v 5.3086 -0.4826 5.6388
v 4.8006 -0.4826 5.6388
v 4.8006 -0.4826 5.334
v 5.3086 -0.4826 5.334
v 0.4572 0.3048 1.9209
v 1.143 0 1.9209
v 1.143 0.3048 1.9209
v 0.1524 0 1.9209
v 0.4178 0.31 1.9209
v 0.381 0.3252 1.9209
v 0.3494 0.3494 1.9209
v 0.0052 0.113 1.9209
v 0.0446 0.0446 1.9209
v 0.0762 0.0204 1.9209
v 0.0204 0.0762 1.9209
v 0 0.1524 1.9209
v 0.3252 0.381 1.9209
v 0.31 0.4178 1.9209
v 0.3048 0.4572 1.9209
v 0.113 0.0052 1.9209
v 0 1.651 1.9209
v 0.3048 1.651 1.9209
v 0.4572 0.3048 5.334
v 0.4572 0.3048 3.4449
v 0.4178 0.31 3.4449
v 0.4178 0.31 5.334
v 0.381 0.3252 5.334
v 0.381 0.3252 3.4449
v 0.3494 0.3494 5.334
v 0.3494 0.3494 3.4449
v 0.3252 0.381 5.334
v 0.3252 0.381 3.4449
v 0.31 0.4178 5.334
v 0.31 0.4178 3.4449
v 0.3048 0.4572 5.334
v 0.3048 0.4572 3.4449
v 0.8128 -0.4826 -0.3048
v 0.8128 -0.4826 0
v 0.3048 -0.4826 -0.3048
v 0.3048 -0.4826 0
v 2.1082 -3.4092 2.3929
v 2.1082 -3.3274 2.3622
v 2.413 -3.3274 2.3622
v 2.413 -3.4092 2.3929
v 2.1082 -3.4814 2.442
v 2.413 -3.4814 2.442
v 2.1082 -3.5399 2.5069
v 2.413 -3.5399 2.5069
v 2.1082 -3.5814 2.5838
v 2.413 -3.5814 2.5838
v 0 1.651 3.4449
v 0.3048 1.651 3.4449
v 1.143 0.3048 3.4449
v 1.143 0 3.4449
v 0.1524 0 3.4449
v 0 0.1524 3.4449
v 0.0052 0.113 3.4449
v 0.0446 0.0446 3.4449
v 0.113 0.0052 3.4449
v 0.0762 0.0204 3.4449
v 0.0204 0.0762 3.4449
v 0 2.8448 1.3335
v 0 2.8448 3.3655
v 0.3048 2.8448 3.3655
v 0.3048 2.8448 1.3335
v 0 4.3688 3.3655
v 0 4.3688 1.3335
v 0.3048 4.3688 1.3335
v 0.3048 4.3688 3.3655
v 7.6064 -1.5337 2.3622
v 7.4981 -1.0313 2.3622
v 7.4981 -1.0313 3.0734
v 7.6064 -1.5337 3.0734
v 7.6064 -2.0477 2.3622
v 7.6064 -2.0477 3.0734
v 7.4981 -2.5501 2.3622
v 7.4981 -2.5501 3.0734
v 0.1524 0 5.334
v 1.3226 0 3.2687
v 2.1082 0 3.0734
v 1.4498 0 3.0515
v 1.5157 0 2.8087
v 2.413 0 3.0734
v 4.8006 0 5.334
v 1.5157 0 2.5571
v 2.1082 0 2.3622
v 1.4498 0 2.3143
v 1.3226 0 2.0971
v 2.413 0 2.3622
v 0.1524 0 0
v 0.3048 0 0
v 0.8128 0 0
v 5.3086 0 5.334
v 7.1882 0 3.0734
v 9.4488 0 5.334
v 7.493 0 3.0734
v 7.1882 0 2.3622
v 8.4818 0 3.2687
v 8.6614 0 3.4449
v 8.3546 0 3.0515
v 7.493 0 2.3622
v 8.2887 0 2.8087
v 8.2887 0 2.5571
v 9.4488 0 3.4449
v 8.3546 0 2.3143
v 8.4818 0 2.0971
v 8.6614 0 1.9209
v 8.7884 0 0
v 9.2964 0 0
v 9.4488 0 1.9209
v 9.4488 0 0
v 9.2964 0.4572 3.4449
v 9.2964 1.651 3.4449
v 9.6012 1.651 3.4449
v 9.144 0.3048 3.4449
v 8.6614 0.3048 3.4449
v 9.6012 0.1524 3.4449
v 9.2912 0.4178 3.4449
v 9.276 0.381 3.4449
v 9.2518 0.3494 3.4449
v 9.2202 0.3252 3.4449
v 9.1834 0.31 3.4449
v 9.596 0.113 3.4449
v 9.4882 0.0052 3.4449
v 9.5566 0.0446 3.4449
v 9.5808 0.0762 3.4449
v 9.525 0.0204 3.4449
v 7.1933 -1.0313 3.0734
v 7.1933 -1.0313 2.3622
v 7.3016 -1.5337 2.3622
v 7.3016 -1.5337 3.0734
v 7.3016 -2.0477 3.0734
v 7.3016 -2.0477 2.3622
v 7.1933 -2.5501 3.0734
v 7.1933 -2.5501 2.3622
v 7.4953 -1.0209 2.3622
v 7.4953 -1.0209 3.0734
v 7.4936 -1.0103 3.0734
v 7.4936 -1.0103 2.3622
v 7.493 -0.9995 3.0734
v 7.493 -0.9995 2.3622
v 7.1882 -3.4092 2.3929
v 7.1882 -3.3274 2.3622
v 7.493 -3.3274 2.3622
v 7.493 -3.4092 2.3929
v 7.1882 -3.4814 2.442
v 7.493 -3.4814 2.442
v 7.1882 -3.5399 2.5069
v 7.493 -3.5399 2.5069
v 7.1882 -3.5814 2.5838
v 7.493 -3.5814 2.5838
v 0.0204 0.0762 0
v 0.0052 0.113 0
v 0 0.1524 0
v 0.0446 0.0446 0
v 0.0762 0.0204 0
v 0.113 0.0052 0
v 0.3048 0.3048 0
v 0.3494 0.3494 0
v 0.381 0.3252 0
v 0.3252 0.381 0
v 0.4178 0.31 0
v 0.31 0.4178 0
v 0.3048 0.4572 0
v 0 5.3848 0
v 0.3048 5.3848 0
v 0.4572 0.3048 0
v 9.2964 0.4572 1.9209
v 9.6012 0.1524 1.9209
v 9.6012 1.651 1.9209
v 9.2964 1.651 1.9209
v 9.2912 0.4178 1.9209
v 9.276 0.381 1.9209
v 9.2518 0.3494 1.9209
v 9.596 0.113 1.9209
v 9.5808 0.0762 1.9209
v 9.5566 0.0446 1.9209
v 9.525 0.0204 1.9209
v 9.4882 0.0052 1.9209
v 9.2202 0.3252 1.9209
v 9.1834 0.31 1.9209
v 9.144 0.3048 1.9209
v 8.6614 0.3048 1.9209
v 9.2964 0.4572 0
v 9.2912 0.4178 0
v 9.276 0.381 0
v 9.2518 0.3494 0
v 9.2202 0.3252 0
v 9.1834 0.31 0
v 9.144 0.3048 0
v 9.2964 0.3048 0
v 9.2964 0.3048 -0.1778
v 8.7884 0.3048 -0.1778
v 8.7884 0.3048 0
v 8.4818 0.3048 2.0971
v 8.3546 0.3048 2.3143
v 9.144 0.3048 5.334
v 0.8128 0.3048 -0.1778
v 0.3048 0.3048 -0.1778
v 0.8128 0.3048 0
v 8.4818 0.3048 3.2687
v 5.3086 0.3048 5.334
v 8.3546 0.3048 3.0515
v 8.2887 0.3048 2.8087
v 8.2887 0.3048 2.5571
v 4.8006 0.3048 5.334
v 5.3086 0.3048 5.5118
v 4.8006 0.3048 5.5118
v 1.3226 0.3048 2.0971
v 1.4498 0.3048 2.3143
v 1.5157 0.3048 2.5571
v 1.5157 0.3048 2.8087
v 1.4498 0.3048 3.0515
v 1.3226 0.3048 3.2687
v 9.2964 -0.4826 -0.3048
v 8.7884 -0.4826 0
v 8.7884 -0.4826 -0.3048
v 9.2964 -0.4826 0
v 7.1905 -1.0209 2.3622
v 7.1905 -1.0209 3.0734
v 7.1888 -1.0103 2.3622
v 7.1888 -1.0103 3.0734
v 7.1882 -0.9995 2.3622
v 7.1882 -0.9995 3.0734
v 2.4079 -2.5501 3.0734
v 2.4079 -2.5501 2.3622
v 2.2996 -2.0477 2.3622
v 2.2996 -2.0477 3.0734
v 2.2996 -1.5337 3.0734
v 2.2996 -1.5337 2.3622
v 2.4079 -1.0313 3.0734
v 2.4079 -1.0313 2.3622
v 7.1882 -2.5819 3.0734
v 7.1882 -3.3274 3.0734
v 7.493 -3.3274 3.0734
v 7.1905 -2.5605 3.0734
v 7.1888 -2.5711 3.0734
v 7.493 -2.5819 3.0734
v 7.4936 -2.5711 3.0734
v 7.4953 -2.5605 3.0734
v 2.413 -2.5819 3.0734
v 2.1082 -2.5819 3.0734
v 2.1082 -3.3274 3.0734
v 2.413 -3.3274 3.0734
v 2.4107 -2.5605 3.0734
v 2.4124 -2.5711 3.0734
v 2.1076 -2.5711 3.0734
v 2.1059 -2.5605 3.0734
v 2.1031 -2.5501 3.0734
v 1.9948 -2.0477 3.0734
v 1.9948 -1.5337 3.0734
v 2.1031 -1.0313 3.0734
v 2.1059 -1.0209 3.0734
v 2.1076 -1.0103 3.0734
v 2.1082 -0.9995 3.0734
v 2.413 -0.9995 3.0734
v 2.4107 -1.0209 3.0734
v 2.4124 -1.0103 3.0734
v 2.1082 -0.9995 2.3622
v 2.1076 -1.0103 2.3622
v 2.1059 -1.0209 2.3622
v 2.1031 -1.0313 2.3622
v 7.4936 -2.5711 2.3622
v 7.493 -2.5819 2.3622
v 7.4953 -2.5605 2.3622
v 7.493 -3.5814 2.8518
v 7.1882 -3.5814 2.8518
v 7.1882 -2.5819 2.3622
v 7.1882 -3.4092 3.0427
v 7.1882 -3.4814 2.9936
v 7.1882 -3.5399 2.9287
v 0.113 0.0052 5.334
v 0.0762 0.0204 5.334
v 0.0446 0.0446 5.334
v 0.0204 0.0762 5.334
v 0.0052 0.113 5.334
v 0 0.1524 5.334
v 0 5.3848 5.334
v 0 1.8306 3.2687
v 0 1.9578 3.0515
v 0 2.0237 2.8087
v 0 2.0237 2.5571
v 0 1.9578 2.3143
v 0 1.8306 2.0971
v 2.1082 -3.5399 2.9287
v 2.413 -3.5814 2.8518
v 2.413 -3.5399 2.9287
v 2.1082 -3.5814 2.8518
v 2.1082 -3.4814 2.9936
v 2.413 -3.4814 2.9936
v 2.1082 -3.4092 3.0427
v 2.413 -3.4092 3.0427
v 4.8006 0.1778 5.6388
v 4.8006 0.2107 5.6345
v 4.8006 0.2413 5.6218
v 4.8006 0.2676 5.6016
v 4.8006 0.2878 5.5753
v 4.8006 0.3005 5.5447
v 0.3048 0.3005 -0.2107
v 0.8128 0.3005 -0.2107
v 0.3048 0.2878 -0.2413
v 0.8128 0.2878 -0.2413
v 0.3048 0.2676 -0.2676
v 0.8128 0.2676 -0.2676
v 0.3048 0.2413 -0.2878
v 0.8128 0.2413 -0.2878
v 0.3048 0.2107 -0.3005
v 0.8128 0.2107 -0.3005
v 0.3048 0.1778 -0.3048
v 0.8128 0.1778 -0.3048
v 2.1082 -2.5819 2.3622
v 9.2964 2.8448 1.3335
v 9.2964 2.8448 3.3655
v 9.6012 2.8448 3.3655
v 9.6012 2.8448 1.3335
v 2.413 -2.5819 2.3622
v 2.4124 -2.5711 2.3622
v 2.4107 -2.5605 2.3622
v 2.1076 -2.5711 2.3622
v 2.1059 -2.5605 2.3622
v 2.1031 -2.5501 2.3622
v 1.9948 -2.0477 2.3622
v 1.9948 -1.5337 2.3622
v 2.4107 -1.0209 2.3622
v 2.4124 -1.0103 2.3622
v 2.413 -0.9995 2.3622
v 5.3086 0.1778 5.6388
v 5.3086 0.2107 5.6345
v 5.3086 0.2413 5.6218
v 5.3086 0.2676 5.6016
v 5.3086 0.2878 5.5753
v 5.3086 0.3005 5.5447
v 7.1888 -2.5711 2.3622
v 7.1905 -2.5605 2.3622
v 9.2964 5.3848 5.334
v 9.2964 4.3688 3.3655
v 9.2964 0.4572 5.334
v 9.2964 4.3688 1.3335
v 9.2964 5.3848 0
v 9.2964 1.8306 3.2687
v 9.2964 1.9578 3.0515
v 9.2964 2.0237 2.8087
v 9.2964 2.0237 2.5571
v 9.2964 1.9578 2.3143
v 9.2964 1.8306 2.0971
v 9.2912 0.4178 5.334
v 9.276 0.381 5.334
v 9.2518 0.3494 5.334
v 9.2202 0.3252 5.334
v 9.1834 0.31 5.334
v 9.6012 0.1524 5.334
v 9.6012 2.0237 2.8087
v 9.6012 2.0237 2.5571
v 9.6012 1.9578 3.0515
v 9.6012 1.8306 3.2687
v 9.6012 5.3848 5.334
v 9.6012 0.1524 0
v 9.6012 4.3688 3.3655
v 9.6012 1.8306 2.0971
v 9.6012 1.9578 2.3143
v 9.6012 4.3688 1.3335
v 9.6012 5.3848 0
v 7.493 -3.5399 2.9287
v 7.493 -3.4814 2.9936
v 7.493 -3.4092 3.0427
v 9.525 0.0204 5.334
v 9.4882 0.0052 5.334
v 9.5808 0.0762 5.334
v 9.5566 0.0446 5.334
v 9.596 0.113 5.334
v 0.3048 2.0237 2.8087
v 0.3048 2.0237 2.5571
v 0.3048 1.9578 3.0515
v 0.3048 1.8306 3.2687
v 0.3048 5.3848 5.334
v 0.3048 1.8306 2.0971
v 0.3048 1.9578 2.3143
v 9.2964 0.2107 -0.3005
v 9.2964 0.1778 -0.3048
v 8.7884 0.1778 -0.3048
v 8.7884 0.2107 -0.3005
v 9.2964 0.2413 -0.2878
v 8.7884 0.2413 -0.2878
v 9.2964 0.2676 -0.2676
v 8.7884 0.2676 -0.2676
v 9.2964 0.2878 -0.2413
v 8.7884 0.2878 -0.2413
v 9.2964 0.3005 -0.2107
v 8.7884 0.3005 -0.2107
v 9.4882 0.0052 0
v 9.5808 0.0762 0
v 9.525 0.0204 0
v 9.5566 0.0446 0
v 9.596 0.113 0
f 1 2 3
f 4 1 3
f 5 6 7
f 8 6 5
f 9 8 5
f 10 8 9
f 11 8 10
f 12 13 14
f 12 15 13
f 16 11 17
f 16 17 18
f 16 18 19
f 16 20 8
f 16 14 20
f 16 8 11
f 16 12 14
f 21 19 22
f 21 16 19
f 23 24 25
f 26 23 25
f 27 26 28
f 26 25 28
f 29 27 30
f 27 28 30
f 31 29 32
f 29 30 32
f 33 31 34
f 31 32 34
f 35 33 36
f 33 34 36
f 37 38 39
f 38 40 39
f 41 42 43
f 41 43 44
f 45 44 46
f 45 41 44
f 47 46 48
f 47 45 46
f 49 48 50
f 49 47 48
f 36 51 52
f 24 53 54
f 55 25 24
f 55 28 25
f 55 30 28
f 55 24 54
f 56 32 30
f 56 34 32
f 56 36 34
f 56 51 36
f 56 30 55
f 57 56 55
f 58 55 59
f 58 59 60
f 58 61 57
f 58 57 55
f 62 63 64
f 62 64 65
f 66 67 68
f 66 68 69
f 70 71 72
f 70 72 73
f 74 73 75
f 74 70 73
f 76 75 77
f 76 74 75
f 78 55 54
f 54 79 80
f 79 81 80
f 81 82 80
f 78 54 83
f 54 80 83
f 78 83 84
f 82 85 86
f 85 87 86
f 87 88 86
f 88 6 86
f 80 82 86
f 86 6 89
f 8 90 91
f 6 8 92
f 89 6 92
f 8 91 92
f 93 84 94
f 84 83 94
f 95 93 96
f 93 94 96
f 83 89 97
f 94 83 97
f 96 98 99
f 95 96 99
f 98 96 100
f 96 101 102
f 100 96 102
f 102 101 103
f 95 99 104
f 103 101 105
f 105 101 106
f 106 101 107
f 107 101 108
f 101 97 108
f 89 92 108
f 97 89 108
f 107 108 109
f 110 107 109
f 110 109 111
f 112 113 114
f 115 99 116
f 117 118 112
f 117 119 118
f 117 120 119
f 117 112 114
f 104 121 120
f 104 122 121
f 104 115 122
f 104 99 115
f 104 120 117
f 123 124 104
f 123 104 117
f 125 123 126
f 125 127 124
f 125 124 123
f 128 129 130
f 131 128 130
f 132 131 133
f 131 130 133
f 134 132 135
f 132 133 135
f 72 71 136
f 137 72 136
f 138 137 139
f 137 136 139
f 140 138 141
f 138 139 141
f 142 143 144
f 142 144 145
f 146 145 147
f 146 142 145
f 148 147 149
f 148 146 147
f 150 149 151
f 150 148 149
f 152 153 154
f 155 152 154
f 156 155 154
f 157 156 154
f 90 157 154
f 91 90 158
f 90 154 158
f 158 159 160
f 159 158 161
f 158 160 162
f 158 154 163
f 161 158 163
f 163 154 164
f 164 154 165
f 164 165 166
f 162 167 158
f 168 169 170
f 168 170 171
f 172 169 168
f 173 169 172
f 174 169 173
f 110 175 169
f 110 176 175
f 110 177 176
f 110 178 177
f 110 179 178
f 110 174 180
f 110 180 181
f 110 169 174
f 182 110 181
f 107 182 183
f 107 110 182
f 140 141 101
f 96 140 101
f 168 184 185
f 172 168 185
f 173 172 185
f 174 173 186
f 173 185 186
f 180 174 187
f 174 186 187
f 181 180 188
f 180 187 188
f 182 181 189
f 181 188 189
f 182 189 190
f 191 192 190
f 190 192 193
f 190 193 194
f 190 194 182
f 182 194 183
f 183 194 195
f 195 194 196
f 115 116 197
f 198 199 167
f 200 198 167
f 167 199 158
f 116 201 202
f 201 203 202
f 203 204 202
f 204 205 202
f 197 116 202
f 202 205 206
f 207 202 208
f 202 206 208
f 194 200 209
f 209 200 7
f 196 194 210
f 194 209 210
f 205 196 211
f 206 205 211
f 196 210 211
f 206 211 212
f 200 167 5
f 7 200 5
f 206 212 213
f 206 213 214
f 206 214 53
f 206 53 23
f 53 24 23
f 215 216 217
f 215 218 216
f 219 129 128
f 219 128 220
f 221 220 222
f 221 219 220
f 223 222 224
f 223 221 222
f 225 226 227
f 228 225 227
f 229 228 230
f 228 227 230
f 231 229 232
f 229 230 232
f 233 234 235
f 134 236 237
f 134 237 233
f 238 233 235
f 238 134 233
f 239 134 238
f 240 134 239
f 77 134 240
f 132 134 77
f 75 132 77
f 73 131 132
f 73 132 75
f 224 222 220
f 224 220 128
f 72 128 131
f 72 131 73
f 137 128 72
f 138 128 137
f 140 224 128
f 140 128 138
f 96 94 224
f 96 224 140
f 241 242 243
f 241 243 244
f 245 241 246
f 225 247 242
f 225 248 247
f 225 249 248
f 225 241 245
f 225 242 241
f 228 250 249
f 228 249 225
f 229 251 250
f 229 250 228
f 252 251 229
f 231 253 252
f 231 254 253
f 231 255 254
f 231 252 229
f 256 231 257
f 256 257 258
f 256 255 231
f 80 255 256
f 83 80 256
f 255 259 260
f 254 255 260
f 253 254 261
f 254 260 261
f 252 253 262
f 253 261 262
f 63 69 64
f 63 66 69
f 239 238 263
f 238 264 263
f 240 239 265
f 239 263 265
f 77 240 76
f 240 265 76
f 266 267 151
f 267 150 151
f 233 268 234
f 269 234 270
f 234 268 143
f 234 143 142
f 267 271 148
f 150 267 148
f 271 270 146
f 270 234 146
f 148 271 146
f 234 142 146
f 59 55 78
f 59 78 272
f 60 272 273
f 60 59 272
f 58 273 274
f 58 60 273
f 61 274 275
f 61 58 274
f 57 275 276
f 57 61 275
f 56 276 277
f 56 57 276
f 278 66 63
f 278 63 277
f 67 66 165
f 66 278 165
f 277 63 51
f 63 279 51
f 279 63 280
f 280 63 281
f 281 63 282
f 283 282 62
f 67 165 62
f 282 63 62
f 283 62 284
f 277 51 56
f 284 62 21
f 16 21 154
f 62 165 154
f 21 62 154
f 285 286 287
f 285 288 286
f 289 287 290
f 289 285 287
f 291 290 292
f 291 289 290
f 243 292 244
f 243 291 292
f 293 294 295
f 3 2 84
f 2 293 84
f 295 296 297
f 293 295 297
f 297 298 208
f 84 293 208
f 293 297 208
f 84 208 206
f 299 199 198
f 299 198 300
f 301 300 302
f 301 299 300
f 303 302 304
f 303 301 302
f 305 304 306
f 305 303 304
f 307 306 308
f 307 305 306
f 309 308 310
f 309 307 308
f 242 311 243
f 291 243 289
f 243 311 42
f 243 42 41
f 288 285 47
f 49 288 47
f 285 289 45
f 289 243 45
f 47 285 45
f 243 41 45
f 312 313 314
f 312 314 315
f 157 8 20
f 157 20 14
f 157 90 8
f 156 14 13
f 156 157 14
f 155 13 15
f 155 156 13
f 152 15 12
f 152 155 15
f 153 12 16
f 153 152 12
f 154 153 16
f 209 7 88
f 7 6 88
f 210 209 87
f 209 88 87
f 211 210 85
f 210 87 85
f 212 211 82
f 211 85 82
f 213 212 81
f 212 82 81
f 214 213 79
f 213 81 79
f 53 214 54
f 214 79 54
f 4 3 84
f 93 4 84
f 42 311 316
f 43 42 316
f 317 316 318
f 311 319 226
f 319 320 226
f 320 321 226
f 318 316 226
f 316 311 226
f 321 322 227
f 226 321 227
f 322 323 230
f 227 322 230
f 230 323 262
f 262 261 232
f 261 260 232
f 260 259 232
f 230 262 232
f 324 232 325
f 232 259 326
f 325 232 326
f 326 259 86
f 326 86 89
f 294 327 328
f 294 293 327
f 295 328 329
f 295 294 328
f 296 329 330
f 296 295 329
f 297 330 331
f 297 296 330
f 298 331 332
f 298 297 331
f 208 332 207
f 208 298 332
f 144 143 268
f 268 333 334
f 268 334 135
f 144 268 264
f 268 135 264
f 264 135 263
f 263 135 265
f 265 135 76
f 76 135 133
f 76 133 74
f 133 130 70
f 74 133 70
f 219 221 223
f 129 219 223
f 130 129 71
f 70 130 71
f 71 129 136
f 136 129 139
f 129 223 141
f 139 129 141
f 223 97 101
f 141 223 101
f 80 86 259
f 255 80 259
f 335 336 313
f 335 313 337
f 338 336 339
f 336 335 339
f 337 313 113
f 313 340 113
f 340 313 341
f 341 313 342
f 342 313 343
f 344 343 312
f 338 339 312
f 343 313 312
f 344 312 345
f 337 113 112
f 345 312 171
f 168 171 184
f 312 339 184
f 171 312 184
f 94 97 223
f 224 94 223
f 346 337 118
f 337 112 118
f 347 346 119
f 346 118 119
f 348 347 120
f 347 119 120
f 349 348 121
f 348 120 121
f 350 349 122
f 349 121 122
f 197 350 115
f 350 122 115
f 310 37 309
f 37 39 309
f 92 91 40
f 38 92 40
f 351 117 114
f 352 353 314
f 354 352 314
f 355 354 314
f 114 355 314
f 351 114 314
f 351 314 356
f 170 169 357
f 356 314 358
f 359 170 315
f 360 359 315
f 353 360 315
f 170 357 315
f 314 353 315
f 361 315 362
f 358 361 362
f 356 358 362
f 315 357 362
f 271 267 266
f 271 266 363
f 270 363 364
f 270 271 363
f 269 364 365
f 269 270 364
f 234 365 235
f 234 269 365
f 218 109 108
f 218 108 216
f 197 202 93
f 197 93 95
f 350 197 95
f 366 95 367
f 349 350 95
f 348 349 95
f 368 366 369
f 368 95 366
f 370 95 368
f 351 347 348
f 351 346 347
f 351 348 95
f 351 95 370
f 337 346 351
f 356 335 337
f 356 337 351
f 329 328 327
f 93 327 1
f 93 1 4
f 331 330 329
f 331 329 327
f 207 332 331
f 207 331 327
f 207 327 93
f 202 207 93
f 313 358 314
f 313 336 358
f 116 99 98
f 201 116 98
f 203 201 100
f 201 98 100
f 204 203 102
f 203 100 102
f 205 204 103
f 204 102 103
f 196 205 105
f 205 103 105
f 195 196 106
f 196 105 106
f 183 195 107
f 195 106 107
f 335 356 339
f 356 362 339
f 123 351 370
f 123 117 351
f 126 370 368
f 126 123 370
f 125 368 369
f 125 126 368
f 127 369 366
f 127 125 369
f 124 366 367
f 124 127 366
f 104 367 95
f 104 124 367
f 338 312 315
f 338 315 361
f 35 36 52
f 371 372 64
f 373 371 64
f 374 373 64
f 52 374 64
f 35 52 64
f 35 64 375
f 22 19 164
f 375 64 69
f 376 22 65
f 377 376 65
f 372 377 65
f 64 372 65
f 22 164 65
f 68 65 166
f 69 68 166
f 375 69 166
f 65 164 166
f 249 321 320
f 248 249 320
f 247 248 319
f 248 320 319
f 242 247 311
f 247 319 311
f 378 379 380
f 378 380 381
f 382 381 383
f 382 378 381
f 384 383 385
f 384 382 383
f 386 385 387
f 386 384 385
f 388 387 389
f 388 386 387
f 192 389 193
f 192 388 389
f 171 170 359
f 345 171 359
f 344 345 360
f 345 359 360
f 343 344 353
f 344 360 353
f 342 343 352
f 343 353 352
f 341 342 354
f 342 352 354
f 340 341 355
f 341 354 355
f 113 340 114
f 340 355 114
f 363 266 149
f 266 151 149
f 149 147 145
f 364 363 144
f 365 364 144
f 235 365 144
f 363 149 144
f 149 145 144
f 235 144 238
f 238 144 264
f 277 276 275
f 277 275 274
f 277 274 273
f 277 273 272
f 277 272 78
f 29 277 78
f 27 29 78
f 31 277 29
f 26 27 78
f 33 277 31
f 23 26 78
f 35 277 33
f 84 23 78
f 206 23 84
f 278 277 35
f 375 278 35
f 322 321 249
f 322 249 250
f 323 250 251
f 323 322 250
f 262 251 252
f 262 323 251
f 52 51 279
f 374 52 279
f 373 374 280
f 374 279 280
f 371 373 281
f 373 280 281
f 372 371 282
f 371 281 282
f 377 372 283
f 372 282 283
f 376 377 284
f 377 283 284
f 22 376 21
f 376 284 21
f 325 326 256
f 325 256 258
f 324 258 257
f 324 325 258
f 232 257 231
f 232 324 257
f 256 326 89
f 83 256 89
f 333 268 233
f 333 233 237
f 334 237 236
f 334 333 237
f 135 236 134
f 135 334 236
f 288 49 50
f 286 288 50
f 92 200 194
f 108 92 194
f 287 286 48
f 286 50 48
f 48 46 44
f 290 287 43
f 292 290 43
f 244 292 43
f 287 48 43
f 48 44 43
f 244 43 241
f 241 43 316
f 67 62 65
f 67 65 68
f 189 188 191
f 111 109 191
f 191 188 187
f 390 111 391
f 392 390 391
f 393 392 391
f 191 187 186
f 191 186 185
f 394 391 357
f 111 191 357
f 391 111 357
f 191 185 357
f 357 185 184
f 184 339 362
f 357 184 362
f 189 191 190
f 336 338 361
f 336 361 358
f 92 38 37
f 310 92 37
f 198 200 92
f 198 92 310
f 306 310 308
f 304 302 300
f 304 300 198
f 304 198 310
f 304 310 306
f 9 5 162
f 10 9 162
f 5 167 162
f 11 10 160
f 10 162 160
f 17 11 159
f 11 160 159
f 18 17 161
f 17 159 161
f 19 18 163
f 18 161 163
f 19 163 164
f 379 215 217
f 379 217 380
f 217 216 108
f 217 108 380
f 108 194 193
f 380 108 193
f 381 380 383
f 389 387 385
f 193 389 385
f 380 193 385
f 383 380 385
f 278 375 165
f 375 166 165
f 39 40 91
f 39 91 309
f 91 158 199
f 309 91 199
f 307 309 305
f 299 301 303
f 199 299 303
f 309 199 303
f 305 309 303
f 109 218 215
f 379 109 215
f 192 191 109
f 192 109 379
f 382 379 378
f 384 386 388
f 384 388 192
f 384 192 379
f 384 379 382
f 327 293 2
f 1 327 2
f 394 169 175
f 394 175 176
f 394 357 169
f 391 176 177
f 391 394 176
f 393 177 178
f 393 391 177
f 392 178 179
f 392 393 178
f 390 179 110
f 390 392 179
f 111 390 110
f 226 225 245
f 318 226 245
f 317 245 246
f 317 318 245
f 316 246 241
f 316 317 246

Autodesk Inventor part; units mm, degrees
sketch "Sketch_1" plane through (0, 0, 0) normal (0, 0, 1) x (1, 0, 0)
  arc A0 (0, 0.1524) -> (0.1524, 0) centre (0.1524, 0.1524) ccw
  line L0 (0.1524, 0) -> (9.4488, 0)
  arc A1 (9.4488, 0) -> (9.6012, 0.1524) centre (9.4488, 0.1524) ccw
  line L1 (9.6012, 0.1524) -> (9.6012, 5.3848)
  line L2 (9.6012, 5.3848) -> (9.2964, 5.3848)
  line L3 (9.2964, 5.3848) -> (9.2964, 0.4572)
  arc A2 (9.144, 0.3048) -> (9.2964, 0.4572) centre (9.144, 0.4572) ccw
  line L4 (9.144, 0.3048) -> (0.4572, 0.3048)
  arc A3 (0.3048, 0.4572) -> (0.4572, 0.3048) centre (0.4572, 0.4572) ccw
  line L5 (0.3048, 0.4572) -> (0.3048, 5.3848)
  line L6 (0.3048, 5.3848) -> (0, 5.3848)
  line L7 (0, 5.3848) -> (0, 0.1524)
extrude "Extrusion1" add sketch "Sketch_1" along normal blind 5.334
sketch "Sketch_3" plane through (0, 0, 2.3622) normal (0, 0, 1) x (1, 0, 0)
  arc A0 (2.1031, -1.0313) -> (2.1031, -2.5501) centre (4.4075, -1.7907) ccw
  arc A1 (2.1082, -2.5819) -> (2.1031, -2.5501) centre (2.0066, -2.5819) ccw
  line L0 (2.1082, -2.5819) -> (2.1082, -3.5814)
  line L1 (2.1082, -3.5814) -> (2.413, -3.5814)
  line L2 (2.413, -3.5814) -> (2.413, -2.5819)
  arc A2 (2.413, -2.5819) -> (2.4079, -2.5501) centre (2.3114, -2.5819) ccw
  arc A3 (2.4079, -1.0313) -> (2.4079, -2.5501) centre (4.7123, -1.7907) ccw
  arc A4 (2.4079, -1.0313) -> (2.413, -0.9995) centre (2.3114, -0.9995) ccw
  line L3 (2.413, -0.9995) -> (2.413, 0)
  line L4 (2.413, 0) -> (2.1082, 0)
  line L5 (2.1082, 0) -> (2.1082, -0.9995)
  arc A5 (2.1031, -1.0313) -> (2.1082, -0.9995) centre (2.0066, -0.9995) ccw
extrude "Extrusion2" add sketch "Sketch_3" along normal blind 0.7112
sketch "Sketch_4" plane through (0, 0, 2.3622) normal (0, 0, 1) x (1, 0, 0)
  arc A0 (7.1882, -0.9995) -> (7.1933, -1.0313) centre (7.2898, -0.9995) ccw
  arc A1 (7.1933, -2.5501) -> (7.1933, -1.0313) centre (4.8889, -1.7907) ccw
  arc A2 (7.1933, -2.5501) -> (7.1882, -2.5819) centre (7.2898, -2.5819) ccw
  line L0 (7.1882, -2.5819) -> (7.1882, -3.5814)
  line L1 (7.1882, -3.5814) -> (7.493, -3.5814)
  line L2 (7.493, -3.5814) -> (7.493, -2.5819)
  arc A3 (7.4981, -2.5501) -> (7.493, -2.5819) centre (7.5946, -2.5819) ccw
  arc A4 (7.4981, -2.5501) -> (7.4981, -1.0313) centre (5.1937, -1.7907) ccw
  arc A5 (7.493, -0.9995) -> (7.4981, -1.0313) centre (7.5946, -0.9995) ccw
  line L3 (7.493, -0.9995) -> (7.493, 0)
  line L4 (7.493, 0) -> (7.1882, 0)
  line L5 (7.1882, 0) -> (7.1882, -0.9995)
extrude "Extrusion3" add sketch "Sketch_4" along normal blind 0.7112
sketch "Sketch_5" plane through (0, 0, 0) normal (1, 0, 0) x (0, 1, 0)
  line L0 (-3.3274, 3.0734) -> (-3.8354, 3.0734)
  line L1 (-3.8354, 3.0734) -> (-3.8354, 2.3622)
  line L2 (-3.8354, 2.3622) -> (-3.3274, 2.3622)
  arc A0 (-3.3274, 3.0734) -> (-3.3274, 2.3622) centre (-3.2408, 2.7178) ccw
extrude "Extrusion4" cut sketch "Sketch_5" along normal blind 8.3058
sketch "Sketch_6" plane through (0, 0, 0) normal (1, 0, 0) x (0, 1, 0)
  line L0 (2.8448, 3.3655) -> (2.8448, 1.3335)
  line L1 (2.8448, 1.3335) -> (4.3688, 1.3335)
  line L2 (4.3688, 1.3335) -> (4.3688, 3.3655)
  line L3 (4.3688, 3.3655) -> (2.8448, 3.3655)
extrude "Extrusion5" cut sketch "Sketch_6" along normal blind 10.16
sketch "Sketch_7" plane through (0, 0, 0) normal (1, 0, 0) x (0, 1, 0)
  line L0 (1.651, 3.4449) -> (0, 3.4449)
  line L1 (0, 3.4449) -> (0, 1.9209)
  line L2 (0, 1.9209) -> (1.651, 1.9209)
  arc A0 (1.651, 1.9209) -> (1.651, 3.4449) centre (1.0795, 2.6829) ccw
extrude "Extrusion6" cut sketch "Sketch_7" along normal blind 0.3048
sketch "Sketch_8" plane through (9.8044, 0, 0) normal (1, 0, 0) x (0, 0, -1)
  line L0 (-3.4449, 1.651) -> (-3.4449, 0)
  line L1 (-3.4449, 0) -> (-1.9209, 0)
  line L2 (-1.9209, 0) -> (-1.9209, 1.651)
  arc A0 (-1.9209, 1.651) -> (-3.4449, 1.651) centre (-2.6829, 1.0795) ccw
extrude "Extrusion7" cut sketch "Sketch_8" against normal blind 0.508
sketch "Sketch_9" plane through (0, 0, 0) normal (0, 1, 0) x (-1, 0, 0)
  line L0 (0, 1.9209) -> (0, 3.4449)
  line L1 (0, 3.4449) -> (-1.143, 3.4449)
  arc A0 (-1.143, 3.4449) -> (-1.143, 1.9209) centre (-0.5715, 2.6829) ccw
  line L2 (-1.143, 1.9209) -> (0, 1.9209)
extrude "Extrusion8" cut sketch "Sketch_9" along normal blind 0.508
sketch "Sketch_10" plane through (0, 0, 0) normal (0, 1, 0) x (-1, 0, 0)
  arc A0 (-8.6614, 1.9209) -> (-8.6614, 3.4449) centre (-9.2329, 2.6829) ccw
  line L0 (-8.6614, 3.4449) -> (-9.8044, 3.4449)
  line L1 (-9.8044, 3.4449) -> (-9.8044, 1.9209)
  line L2 (-9.8044, 1.9209) -> (-8.6614, 1.9209)
extrude "Extrusion9" cut sketch "Sketch_10" along normal blind 0.508
sketch "Sketch_11" plane through (0.3048, 0, 0) normal (1, 0, 0) x (0, 0, -1)
  line L0 (0, -0.4826) -> (0.3048, -0.4826)
  line L1 (0.3048, -0.4826) -> (0.3048, 0.1778)
  arc A0 (0.3048, 0.1778) -> (0.1778, 0.3048) centre (0.1778, 0.1778) ccw
  line L2 (0.1778, 0.3048) -> (0, 0.3048)
  line L3 (0, 0.3048) -> (0, -0.4826)
extrude "Extrusion10" add sketch "Sketch_11" along normal blind 0.508
sketch "Sketch_12" plane through (9.2964, 0, 0) normal (1, 0, 0) x (0, 0, -1)
  line L0 (0, -0.4826) -> (0.3048, -0.4826)
  line L1 (0.3048, -0.4826) -> (0.3048, 0.1778)
  arc A0 (0.3048, 0.1778) -> (0.1778, 0.3048) centre (0.1778, 0.1778) ccw
  line L2 (0.1778, 0.3048) -> (0, 0.3048)
  line L3 (0, 0.3048) -> (0, -0.4826)
extrude "Extrusion11" add sketch "Sketch_12" against normal blind 0.508
sketch "Sketch_13" plane through (4.8006, 0, 0) normal (1, 0, 0) x (0, 0, -1)
  line L0 (-5.6388, -0.4826) -> (-5.334, -0.4826)
  line L1 (-5.334, -0.4826) -> (-5.334, 0.3048)
  line L2 (-5.334, 0.3048) -> (-5.5118, 0.3048)
  arc A0 (-5.5118, 0.3048) -> (-5.6388, 0.1778) centre (-5.5118, 0.1778) ccw
  line L3 (-5.6388, 0.1778) -> (-5.6388, -0.4826)
extrude "Extrusion12" add sketch "Sketch_13" along normal blind 0.508
ref_plane "cp_right_body_pole1_XY" through (4.8006, 0.3048, 3.3655) normal (0, -1, 0) x (1, 0, 0)
ref_plane "cp_right_body_pole1_YZ" through (4.8006, 0.3048, 3.3655) normal (1, 0, 0) x (0, 0, 1)
ref_plane "cp_right_body_pole1_ZX" through (4.8006, 0.3048, 3.3655) normal (0, 0, 1) x (0, -1, 0)
properties part number "AS11CHra1"
